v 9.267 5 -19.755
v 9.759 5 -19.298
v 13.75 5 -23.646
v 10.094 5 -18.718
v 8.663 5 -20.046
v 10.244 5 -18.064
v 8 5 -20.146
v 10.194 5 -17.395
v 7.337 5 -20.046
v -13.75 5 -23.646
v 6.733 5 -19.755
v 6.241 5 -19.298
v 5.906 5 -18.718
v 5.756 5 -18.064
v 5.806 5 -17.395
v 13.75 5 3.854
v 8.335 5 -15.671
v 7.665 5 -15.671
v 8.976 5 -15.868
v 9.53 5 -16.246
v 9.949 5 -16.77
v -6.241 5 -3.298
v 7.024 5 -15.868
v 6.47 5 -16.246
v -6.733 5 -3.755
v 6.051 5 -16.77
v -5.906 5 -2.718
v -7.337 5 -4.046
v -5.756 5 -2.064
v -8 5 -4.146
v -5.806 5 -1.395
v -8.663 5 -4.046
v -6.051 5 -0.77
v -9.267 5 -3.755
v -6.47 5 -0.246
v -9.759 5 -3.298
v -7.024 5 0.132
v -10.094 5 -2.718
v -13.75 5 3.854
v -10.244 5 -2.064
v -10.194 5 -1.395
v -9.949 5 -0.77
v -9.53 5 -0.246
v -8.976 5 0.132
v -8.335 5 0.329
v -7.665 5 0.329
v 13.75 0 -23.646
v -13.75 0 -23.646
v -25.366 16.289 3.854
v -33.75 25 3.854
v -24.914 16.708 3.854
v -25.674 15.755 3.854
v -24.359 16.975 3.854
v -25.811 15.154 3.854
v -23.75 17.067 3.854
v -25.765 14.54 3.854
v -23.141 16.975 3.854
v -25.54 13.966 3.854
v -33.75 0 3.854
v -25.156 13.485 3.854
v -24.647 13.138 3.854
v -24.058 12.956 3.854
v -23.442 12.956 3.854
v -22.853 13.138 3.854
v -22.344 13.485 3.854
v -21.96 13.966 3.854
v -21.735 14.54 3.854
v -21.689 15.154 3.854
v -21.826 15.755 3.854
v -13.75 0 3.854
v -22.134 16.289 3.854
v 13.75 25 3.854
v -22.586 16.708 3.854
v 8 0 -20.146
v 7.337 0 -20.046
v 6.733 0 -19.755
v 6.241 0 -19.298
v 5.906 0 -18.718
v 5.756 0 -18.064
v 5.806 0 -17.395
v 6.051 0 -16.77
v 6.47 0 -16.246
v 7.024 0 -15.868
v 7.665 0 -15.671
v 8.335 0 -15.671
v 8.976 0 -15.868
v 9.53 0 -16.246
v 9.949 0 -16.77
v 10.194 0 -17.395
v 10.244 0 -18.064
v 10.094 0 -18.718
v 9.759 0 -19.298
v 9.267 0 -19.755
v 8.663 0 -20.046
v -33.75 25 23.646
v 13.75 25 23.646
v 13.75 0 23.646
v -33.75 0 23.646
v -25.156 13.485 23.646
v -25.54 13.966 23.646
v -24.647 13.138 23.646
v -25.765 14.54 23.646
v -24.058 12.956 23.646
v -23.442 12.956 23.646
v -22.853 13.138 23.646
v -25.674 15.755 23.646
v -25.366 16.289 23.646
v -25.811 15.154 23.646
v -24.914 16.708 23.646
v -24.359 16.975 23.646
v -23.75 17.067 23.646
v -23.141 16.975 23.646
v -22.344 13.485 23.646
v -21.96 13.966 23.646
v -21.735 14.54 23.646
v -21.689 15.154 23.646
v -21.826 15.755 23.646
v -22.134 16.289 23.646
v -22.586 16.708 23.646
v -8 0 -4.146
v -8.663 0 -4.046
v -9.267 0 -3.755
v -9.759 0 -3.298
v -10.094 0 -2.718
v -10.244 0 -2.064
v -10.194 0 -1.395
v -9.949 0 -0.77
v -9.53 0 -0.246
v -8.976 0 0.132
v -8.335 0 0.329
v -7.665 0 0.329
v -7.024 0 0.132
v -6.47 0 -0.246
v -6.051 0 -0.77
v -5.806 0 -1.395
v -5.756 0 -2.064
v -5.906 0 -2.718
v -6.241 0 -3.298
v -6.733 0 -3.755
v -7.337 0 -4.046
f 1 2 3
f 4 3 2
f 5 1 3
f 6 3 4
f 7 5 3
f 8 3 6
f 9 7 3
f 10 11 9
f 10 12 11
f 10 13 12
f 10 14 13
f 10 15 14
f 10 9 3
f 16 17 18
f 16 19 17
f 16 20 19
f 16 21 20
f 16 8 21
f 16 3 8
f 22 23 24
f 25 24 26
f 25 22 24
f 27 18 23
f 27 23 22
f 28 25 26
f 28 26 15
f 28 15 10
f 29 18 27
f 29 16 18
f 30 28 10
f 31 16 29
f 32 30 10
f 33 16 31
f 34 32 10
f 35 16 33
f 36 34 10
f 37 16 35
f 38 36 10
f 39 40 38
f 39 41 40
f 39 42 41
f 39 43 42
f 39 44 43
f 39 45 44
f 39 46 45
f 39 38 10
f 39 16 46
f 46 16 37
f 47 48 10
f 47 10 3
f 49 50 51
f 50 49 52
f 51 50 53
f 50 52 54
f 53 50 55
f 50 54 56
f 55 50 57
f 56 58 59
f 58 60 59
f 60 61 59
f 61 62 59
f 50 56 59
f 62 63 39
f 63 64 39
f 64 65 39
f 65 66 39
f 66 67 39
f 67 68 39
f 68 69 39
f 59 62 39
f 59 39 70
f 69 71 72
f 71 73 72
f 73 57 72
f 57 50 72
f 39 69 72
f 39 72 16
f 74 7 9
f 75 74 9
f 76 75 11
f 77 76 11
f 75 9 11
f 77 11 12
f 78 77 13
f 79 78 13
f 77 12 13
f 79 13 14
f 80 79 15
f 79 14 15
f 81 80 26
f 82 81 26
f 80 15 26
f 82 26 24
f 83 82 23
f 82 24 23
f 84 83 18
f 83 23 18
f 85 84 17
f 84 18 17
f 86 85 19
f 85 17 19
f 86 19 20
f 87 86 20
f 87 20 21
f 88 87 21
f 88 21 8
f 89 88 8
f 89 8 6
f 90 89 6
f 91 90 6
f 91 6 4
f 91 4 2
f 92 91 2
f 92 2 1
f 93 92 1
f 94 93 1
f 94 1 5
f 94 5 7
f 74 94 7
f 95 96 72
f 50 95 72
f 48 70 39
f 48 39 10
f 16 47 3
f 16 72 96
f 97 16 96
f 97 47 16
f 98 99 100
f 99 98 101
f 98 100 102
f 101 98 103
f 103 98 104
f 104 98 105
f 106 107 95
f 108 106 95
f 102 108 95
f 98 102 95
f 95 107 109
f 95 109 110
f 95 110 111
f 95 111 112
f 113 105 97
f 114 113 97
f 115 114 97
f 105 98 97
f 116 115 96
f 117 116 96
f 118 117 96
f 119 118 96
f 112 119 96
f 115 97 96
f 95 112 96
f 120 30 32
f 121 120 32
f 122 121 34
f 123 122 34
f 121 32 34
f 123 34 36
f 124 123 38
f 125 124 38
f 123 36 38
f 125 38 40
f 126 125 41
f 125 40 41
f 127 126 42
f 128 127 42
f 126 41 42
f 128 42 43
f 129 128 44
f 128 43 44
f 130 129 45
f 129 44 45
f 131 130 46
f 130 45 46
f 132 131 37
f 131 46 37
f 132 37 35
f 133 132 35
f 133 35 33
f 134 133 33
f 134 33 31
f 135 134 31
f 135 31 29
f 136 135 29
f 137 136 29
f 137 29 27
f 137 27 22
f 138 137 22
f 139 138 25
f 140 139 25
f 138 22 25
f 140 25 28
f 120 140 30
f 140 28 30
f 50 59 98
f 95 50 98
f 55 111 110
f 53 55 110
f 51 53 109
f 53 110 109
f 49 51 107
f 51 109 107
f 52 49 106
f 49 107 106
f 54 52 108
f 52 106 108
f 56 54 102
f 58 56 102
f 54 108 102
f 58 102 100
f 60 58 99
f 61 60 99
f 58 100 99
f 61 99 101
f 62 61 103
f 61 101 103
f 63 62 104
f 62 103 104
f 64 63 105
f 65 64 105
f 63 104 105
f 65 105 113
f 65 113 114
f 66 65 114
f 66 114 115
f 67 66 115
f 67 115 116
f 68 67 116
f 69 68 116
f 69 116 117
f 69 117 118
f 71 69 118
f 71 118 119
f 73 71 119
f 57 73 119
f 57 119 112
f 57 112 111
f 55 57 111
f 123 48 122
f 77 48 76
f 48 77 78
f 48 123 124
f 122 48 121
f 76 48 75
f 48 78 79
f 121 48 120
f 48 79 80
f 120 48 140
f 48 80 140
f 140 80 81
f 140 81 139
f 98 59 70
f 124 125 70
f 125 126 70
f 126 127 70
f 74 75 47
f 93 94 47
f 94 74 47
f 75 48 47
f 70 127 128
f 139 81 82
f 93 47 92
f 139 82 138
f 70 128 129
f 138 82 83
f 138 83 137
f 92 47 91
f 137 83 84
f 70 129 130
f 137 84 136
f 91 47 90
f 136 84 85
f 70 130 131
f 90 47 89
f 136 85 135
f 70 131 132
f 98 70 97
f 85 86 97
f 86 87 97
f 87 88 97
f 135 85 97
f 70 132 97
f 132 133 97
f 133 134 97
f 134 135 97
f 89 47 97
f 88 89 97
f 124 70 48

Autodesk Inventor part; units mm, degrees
ref_plane "YZ Plane" through (0, 0, 0) normal (1, 0, 0) x (0, 1, 0)
ref_plane "XZ Plane" through (0, 0, 0) normal (0, 1, 0) x (-1, 0, 0)
ref_plane "XY Plane" through (0, 0, 0) normal (0, 0, 1) x (1, 0, 0)
sketch "Sketch1" plane through (0, 0, 0) normal (0, 1, 0) x (-1, 0, 0)
  line L0 (-13.75, 23.6455) -> (13.75, 23.6455)
  line L1 (13.75, 23.6455) -> (13.75, -23.6455)
  line L2 (13.75, -23.6455) -> (-13.75, -23.6455)
  line L3 (-13.75, -23.6455) -> (-13.75, 23.6455)
  line L4 (-13.75, 23.6455) -> (13.75, -23.6455) construction
  line L5 (13.75, 23.6455) -> (-13.75, -23.6455) construction
  point P0 (0, 0)
  dimension "d0" = 47.291
  dimension "d1" = 27.5
extrude "Extrusion1" add sketch "Sketch1" along normal blind 5
sketch "Sketch2" plane through (0, 5, 0) normal (0, 1, 0) x (1, 0, 0)
  line L0 (-13.75, 23.6455) -> (-13.75, -23.6455) projected
  line L1 (13.75, -23.6455) -> (13.75, 23.6455) projected
  line L2 (-13.75, -23.6455) -> (13.75, -23.6455)
  line L3 (13.75, -23.6455) -> (13.75, -3.8545)
  line L4 (13.75, -3.8545) -> (-13.75, -3.8545)
  line L5 (-13.75, -3.8545) -> (-13.75, -23.6455)
  point P0 (0, 0)
  dimension "d4" = 19.791
extrude "Extrusion2" add sketch "Sketch2" along normal blind 20
sketch "Sketch5" plane through (-13.75, 0, -23.6455) normal (-1, 0, 0) x (0, 0, 1)
  line L0 (47.291, 25) -> (27.5, 25) projected
  line L1 (0, 0) -> (47.291, 0) projected
  line L2 (47.291, 25) -> (27.5, 25)
  line L3 (27.5, 25) -> (27.5, 0)
  line L4 (27.5, 0) -> (47.291, 0)
  line L5 (47.291, 0) -> (47.291, 25)
  line L6 (27.5, 5) -> (27.5, 25) projected
  point P0 (23.6455, 0)
  dimension "d27" = 0
extrude "Extrusion3" add sketch "Sketch5" along normal blind 20
sketch "Sketch3" plane through (0, 0, 0) normal (0, -1, 0) x (1, 0, 0)
  line L0 (13.75, -23.6455) -> (-13.75, -23.6455) projected
  line L1 (13.75, 23.6455) -> (13.75, -23.6455) projected
  point P0 (0, 0)
  point P1 (8, -17.8955)
  point P2 (-8, -1.8955)
  dimension "d7" = 5.75
  dimension "d8" = 5.75
  dimension "d9" = 16
  dimension "d10" = 16
hole "Hole1" at (8, 0, -17.8955) at (-8, 0, -1.8955) direction (0, 1, 0) diameter 4.5 end through all
sketch "Sketch4" plane through (13.75, 5, 3.8545) normal (0, 0, -1) x (-1, 0, 0)
  line L0 (27.5, 0) -> (27.5, 20) projected
  line L1 (27.5, 0) -> (0, 0) projected
  line L2 (47.5, 20) -> (47.5, -5) projected
  point P0 (13.75, -5)
  point P1 (37.5, 10)
  dimension "d19" = 10
  dimension "d30" = 10
hole "Hole2" at (-23.75, 15, 3.8545) direction (0, 0, 1) diameter 4.134 end through all thread size "M5x0.8" class "6H" standard "ISO Metric profile"
equation "\"d8\" = d7"
properties part number "ER_Positionierungseinheit_Greifer"
